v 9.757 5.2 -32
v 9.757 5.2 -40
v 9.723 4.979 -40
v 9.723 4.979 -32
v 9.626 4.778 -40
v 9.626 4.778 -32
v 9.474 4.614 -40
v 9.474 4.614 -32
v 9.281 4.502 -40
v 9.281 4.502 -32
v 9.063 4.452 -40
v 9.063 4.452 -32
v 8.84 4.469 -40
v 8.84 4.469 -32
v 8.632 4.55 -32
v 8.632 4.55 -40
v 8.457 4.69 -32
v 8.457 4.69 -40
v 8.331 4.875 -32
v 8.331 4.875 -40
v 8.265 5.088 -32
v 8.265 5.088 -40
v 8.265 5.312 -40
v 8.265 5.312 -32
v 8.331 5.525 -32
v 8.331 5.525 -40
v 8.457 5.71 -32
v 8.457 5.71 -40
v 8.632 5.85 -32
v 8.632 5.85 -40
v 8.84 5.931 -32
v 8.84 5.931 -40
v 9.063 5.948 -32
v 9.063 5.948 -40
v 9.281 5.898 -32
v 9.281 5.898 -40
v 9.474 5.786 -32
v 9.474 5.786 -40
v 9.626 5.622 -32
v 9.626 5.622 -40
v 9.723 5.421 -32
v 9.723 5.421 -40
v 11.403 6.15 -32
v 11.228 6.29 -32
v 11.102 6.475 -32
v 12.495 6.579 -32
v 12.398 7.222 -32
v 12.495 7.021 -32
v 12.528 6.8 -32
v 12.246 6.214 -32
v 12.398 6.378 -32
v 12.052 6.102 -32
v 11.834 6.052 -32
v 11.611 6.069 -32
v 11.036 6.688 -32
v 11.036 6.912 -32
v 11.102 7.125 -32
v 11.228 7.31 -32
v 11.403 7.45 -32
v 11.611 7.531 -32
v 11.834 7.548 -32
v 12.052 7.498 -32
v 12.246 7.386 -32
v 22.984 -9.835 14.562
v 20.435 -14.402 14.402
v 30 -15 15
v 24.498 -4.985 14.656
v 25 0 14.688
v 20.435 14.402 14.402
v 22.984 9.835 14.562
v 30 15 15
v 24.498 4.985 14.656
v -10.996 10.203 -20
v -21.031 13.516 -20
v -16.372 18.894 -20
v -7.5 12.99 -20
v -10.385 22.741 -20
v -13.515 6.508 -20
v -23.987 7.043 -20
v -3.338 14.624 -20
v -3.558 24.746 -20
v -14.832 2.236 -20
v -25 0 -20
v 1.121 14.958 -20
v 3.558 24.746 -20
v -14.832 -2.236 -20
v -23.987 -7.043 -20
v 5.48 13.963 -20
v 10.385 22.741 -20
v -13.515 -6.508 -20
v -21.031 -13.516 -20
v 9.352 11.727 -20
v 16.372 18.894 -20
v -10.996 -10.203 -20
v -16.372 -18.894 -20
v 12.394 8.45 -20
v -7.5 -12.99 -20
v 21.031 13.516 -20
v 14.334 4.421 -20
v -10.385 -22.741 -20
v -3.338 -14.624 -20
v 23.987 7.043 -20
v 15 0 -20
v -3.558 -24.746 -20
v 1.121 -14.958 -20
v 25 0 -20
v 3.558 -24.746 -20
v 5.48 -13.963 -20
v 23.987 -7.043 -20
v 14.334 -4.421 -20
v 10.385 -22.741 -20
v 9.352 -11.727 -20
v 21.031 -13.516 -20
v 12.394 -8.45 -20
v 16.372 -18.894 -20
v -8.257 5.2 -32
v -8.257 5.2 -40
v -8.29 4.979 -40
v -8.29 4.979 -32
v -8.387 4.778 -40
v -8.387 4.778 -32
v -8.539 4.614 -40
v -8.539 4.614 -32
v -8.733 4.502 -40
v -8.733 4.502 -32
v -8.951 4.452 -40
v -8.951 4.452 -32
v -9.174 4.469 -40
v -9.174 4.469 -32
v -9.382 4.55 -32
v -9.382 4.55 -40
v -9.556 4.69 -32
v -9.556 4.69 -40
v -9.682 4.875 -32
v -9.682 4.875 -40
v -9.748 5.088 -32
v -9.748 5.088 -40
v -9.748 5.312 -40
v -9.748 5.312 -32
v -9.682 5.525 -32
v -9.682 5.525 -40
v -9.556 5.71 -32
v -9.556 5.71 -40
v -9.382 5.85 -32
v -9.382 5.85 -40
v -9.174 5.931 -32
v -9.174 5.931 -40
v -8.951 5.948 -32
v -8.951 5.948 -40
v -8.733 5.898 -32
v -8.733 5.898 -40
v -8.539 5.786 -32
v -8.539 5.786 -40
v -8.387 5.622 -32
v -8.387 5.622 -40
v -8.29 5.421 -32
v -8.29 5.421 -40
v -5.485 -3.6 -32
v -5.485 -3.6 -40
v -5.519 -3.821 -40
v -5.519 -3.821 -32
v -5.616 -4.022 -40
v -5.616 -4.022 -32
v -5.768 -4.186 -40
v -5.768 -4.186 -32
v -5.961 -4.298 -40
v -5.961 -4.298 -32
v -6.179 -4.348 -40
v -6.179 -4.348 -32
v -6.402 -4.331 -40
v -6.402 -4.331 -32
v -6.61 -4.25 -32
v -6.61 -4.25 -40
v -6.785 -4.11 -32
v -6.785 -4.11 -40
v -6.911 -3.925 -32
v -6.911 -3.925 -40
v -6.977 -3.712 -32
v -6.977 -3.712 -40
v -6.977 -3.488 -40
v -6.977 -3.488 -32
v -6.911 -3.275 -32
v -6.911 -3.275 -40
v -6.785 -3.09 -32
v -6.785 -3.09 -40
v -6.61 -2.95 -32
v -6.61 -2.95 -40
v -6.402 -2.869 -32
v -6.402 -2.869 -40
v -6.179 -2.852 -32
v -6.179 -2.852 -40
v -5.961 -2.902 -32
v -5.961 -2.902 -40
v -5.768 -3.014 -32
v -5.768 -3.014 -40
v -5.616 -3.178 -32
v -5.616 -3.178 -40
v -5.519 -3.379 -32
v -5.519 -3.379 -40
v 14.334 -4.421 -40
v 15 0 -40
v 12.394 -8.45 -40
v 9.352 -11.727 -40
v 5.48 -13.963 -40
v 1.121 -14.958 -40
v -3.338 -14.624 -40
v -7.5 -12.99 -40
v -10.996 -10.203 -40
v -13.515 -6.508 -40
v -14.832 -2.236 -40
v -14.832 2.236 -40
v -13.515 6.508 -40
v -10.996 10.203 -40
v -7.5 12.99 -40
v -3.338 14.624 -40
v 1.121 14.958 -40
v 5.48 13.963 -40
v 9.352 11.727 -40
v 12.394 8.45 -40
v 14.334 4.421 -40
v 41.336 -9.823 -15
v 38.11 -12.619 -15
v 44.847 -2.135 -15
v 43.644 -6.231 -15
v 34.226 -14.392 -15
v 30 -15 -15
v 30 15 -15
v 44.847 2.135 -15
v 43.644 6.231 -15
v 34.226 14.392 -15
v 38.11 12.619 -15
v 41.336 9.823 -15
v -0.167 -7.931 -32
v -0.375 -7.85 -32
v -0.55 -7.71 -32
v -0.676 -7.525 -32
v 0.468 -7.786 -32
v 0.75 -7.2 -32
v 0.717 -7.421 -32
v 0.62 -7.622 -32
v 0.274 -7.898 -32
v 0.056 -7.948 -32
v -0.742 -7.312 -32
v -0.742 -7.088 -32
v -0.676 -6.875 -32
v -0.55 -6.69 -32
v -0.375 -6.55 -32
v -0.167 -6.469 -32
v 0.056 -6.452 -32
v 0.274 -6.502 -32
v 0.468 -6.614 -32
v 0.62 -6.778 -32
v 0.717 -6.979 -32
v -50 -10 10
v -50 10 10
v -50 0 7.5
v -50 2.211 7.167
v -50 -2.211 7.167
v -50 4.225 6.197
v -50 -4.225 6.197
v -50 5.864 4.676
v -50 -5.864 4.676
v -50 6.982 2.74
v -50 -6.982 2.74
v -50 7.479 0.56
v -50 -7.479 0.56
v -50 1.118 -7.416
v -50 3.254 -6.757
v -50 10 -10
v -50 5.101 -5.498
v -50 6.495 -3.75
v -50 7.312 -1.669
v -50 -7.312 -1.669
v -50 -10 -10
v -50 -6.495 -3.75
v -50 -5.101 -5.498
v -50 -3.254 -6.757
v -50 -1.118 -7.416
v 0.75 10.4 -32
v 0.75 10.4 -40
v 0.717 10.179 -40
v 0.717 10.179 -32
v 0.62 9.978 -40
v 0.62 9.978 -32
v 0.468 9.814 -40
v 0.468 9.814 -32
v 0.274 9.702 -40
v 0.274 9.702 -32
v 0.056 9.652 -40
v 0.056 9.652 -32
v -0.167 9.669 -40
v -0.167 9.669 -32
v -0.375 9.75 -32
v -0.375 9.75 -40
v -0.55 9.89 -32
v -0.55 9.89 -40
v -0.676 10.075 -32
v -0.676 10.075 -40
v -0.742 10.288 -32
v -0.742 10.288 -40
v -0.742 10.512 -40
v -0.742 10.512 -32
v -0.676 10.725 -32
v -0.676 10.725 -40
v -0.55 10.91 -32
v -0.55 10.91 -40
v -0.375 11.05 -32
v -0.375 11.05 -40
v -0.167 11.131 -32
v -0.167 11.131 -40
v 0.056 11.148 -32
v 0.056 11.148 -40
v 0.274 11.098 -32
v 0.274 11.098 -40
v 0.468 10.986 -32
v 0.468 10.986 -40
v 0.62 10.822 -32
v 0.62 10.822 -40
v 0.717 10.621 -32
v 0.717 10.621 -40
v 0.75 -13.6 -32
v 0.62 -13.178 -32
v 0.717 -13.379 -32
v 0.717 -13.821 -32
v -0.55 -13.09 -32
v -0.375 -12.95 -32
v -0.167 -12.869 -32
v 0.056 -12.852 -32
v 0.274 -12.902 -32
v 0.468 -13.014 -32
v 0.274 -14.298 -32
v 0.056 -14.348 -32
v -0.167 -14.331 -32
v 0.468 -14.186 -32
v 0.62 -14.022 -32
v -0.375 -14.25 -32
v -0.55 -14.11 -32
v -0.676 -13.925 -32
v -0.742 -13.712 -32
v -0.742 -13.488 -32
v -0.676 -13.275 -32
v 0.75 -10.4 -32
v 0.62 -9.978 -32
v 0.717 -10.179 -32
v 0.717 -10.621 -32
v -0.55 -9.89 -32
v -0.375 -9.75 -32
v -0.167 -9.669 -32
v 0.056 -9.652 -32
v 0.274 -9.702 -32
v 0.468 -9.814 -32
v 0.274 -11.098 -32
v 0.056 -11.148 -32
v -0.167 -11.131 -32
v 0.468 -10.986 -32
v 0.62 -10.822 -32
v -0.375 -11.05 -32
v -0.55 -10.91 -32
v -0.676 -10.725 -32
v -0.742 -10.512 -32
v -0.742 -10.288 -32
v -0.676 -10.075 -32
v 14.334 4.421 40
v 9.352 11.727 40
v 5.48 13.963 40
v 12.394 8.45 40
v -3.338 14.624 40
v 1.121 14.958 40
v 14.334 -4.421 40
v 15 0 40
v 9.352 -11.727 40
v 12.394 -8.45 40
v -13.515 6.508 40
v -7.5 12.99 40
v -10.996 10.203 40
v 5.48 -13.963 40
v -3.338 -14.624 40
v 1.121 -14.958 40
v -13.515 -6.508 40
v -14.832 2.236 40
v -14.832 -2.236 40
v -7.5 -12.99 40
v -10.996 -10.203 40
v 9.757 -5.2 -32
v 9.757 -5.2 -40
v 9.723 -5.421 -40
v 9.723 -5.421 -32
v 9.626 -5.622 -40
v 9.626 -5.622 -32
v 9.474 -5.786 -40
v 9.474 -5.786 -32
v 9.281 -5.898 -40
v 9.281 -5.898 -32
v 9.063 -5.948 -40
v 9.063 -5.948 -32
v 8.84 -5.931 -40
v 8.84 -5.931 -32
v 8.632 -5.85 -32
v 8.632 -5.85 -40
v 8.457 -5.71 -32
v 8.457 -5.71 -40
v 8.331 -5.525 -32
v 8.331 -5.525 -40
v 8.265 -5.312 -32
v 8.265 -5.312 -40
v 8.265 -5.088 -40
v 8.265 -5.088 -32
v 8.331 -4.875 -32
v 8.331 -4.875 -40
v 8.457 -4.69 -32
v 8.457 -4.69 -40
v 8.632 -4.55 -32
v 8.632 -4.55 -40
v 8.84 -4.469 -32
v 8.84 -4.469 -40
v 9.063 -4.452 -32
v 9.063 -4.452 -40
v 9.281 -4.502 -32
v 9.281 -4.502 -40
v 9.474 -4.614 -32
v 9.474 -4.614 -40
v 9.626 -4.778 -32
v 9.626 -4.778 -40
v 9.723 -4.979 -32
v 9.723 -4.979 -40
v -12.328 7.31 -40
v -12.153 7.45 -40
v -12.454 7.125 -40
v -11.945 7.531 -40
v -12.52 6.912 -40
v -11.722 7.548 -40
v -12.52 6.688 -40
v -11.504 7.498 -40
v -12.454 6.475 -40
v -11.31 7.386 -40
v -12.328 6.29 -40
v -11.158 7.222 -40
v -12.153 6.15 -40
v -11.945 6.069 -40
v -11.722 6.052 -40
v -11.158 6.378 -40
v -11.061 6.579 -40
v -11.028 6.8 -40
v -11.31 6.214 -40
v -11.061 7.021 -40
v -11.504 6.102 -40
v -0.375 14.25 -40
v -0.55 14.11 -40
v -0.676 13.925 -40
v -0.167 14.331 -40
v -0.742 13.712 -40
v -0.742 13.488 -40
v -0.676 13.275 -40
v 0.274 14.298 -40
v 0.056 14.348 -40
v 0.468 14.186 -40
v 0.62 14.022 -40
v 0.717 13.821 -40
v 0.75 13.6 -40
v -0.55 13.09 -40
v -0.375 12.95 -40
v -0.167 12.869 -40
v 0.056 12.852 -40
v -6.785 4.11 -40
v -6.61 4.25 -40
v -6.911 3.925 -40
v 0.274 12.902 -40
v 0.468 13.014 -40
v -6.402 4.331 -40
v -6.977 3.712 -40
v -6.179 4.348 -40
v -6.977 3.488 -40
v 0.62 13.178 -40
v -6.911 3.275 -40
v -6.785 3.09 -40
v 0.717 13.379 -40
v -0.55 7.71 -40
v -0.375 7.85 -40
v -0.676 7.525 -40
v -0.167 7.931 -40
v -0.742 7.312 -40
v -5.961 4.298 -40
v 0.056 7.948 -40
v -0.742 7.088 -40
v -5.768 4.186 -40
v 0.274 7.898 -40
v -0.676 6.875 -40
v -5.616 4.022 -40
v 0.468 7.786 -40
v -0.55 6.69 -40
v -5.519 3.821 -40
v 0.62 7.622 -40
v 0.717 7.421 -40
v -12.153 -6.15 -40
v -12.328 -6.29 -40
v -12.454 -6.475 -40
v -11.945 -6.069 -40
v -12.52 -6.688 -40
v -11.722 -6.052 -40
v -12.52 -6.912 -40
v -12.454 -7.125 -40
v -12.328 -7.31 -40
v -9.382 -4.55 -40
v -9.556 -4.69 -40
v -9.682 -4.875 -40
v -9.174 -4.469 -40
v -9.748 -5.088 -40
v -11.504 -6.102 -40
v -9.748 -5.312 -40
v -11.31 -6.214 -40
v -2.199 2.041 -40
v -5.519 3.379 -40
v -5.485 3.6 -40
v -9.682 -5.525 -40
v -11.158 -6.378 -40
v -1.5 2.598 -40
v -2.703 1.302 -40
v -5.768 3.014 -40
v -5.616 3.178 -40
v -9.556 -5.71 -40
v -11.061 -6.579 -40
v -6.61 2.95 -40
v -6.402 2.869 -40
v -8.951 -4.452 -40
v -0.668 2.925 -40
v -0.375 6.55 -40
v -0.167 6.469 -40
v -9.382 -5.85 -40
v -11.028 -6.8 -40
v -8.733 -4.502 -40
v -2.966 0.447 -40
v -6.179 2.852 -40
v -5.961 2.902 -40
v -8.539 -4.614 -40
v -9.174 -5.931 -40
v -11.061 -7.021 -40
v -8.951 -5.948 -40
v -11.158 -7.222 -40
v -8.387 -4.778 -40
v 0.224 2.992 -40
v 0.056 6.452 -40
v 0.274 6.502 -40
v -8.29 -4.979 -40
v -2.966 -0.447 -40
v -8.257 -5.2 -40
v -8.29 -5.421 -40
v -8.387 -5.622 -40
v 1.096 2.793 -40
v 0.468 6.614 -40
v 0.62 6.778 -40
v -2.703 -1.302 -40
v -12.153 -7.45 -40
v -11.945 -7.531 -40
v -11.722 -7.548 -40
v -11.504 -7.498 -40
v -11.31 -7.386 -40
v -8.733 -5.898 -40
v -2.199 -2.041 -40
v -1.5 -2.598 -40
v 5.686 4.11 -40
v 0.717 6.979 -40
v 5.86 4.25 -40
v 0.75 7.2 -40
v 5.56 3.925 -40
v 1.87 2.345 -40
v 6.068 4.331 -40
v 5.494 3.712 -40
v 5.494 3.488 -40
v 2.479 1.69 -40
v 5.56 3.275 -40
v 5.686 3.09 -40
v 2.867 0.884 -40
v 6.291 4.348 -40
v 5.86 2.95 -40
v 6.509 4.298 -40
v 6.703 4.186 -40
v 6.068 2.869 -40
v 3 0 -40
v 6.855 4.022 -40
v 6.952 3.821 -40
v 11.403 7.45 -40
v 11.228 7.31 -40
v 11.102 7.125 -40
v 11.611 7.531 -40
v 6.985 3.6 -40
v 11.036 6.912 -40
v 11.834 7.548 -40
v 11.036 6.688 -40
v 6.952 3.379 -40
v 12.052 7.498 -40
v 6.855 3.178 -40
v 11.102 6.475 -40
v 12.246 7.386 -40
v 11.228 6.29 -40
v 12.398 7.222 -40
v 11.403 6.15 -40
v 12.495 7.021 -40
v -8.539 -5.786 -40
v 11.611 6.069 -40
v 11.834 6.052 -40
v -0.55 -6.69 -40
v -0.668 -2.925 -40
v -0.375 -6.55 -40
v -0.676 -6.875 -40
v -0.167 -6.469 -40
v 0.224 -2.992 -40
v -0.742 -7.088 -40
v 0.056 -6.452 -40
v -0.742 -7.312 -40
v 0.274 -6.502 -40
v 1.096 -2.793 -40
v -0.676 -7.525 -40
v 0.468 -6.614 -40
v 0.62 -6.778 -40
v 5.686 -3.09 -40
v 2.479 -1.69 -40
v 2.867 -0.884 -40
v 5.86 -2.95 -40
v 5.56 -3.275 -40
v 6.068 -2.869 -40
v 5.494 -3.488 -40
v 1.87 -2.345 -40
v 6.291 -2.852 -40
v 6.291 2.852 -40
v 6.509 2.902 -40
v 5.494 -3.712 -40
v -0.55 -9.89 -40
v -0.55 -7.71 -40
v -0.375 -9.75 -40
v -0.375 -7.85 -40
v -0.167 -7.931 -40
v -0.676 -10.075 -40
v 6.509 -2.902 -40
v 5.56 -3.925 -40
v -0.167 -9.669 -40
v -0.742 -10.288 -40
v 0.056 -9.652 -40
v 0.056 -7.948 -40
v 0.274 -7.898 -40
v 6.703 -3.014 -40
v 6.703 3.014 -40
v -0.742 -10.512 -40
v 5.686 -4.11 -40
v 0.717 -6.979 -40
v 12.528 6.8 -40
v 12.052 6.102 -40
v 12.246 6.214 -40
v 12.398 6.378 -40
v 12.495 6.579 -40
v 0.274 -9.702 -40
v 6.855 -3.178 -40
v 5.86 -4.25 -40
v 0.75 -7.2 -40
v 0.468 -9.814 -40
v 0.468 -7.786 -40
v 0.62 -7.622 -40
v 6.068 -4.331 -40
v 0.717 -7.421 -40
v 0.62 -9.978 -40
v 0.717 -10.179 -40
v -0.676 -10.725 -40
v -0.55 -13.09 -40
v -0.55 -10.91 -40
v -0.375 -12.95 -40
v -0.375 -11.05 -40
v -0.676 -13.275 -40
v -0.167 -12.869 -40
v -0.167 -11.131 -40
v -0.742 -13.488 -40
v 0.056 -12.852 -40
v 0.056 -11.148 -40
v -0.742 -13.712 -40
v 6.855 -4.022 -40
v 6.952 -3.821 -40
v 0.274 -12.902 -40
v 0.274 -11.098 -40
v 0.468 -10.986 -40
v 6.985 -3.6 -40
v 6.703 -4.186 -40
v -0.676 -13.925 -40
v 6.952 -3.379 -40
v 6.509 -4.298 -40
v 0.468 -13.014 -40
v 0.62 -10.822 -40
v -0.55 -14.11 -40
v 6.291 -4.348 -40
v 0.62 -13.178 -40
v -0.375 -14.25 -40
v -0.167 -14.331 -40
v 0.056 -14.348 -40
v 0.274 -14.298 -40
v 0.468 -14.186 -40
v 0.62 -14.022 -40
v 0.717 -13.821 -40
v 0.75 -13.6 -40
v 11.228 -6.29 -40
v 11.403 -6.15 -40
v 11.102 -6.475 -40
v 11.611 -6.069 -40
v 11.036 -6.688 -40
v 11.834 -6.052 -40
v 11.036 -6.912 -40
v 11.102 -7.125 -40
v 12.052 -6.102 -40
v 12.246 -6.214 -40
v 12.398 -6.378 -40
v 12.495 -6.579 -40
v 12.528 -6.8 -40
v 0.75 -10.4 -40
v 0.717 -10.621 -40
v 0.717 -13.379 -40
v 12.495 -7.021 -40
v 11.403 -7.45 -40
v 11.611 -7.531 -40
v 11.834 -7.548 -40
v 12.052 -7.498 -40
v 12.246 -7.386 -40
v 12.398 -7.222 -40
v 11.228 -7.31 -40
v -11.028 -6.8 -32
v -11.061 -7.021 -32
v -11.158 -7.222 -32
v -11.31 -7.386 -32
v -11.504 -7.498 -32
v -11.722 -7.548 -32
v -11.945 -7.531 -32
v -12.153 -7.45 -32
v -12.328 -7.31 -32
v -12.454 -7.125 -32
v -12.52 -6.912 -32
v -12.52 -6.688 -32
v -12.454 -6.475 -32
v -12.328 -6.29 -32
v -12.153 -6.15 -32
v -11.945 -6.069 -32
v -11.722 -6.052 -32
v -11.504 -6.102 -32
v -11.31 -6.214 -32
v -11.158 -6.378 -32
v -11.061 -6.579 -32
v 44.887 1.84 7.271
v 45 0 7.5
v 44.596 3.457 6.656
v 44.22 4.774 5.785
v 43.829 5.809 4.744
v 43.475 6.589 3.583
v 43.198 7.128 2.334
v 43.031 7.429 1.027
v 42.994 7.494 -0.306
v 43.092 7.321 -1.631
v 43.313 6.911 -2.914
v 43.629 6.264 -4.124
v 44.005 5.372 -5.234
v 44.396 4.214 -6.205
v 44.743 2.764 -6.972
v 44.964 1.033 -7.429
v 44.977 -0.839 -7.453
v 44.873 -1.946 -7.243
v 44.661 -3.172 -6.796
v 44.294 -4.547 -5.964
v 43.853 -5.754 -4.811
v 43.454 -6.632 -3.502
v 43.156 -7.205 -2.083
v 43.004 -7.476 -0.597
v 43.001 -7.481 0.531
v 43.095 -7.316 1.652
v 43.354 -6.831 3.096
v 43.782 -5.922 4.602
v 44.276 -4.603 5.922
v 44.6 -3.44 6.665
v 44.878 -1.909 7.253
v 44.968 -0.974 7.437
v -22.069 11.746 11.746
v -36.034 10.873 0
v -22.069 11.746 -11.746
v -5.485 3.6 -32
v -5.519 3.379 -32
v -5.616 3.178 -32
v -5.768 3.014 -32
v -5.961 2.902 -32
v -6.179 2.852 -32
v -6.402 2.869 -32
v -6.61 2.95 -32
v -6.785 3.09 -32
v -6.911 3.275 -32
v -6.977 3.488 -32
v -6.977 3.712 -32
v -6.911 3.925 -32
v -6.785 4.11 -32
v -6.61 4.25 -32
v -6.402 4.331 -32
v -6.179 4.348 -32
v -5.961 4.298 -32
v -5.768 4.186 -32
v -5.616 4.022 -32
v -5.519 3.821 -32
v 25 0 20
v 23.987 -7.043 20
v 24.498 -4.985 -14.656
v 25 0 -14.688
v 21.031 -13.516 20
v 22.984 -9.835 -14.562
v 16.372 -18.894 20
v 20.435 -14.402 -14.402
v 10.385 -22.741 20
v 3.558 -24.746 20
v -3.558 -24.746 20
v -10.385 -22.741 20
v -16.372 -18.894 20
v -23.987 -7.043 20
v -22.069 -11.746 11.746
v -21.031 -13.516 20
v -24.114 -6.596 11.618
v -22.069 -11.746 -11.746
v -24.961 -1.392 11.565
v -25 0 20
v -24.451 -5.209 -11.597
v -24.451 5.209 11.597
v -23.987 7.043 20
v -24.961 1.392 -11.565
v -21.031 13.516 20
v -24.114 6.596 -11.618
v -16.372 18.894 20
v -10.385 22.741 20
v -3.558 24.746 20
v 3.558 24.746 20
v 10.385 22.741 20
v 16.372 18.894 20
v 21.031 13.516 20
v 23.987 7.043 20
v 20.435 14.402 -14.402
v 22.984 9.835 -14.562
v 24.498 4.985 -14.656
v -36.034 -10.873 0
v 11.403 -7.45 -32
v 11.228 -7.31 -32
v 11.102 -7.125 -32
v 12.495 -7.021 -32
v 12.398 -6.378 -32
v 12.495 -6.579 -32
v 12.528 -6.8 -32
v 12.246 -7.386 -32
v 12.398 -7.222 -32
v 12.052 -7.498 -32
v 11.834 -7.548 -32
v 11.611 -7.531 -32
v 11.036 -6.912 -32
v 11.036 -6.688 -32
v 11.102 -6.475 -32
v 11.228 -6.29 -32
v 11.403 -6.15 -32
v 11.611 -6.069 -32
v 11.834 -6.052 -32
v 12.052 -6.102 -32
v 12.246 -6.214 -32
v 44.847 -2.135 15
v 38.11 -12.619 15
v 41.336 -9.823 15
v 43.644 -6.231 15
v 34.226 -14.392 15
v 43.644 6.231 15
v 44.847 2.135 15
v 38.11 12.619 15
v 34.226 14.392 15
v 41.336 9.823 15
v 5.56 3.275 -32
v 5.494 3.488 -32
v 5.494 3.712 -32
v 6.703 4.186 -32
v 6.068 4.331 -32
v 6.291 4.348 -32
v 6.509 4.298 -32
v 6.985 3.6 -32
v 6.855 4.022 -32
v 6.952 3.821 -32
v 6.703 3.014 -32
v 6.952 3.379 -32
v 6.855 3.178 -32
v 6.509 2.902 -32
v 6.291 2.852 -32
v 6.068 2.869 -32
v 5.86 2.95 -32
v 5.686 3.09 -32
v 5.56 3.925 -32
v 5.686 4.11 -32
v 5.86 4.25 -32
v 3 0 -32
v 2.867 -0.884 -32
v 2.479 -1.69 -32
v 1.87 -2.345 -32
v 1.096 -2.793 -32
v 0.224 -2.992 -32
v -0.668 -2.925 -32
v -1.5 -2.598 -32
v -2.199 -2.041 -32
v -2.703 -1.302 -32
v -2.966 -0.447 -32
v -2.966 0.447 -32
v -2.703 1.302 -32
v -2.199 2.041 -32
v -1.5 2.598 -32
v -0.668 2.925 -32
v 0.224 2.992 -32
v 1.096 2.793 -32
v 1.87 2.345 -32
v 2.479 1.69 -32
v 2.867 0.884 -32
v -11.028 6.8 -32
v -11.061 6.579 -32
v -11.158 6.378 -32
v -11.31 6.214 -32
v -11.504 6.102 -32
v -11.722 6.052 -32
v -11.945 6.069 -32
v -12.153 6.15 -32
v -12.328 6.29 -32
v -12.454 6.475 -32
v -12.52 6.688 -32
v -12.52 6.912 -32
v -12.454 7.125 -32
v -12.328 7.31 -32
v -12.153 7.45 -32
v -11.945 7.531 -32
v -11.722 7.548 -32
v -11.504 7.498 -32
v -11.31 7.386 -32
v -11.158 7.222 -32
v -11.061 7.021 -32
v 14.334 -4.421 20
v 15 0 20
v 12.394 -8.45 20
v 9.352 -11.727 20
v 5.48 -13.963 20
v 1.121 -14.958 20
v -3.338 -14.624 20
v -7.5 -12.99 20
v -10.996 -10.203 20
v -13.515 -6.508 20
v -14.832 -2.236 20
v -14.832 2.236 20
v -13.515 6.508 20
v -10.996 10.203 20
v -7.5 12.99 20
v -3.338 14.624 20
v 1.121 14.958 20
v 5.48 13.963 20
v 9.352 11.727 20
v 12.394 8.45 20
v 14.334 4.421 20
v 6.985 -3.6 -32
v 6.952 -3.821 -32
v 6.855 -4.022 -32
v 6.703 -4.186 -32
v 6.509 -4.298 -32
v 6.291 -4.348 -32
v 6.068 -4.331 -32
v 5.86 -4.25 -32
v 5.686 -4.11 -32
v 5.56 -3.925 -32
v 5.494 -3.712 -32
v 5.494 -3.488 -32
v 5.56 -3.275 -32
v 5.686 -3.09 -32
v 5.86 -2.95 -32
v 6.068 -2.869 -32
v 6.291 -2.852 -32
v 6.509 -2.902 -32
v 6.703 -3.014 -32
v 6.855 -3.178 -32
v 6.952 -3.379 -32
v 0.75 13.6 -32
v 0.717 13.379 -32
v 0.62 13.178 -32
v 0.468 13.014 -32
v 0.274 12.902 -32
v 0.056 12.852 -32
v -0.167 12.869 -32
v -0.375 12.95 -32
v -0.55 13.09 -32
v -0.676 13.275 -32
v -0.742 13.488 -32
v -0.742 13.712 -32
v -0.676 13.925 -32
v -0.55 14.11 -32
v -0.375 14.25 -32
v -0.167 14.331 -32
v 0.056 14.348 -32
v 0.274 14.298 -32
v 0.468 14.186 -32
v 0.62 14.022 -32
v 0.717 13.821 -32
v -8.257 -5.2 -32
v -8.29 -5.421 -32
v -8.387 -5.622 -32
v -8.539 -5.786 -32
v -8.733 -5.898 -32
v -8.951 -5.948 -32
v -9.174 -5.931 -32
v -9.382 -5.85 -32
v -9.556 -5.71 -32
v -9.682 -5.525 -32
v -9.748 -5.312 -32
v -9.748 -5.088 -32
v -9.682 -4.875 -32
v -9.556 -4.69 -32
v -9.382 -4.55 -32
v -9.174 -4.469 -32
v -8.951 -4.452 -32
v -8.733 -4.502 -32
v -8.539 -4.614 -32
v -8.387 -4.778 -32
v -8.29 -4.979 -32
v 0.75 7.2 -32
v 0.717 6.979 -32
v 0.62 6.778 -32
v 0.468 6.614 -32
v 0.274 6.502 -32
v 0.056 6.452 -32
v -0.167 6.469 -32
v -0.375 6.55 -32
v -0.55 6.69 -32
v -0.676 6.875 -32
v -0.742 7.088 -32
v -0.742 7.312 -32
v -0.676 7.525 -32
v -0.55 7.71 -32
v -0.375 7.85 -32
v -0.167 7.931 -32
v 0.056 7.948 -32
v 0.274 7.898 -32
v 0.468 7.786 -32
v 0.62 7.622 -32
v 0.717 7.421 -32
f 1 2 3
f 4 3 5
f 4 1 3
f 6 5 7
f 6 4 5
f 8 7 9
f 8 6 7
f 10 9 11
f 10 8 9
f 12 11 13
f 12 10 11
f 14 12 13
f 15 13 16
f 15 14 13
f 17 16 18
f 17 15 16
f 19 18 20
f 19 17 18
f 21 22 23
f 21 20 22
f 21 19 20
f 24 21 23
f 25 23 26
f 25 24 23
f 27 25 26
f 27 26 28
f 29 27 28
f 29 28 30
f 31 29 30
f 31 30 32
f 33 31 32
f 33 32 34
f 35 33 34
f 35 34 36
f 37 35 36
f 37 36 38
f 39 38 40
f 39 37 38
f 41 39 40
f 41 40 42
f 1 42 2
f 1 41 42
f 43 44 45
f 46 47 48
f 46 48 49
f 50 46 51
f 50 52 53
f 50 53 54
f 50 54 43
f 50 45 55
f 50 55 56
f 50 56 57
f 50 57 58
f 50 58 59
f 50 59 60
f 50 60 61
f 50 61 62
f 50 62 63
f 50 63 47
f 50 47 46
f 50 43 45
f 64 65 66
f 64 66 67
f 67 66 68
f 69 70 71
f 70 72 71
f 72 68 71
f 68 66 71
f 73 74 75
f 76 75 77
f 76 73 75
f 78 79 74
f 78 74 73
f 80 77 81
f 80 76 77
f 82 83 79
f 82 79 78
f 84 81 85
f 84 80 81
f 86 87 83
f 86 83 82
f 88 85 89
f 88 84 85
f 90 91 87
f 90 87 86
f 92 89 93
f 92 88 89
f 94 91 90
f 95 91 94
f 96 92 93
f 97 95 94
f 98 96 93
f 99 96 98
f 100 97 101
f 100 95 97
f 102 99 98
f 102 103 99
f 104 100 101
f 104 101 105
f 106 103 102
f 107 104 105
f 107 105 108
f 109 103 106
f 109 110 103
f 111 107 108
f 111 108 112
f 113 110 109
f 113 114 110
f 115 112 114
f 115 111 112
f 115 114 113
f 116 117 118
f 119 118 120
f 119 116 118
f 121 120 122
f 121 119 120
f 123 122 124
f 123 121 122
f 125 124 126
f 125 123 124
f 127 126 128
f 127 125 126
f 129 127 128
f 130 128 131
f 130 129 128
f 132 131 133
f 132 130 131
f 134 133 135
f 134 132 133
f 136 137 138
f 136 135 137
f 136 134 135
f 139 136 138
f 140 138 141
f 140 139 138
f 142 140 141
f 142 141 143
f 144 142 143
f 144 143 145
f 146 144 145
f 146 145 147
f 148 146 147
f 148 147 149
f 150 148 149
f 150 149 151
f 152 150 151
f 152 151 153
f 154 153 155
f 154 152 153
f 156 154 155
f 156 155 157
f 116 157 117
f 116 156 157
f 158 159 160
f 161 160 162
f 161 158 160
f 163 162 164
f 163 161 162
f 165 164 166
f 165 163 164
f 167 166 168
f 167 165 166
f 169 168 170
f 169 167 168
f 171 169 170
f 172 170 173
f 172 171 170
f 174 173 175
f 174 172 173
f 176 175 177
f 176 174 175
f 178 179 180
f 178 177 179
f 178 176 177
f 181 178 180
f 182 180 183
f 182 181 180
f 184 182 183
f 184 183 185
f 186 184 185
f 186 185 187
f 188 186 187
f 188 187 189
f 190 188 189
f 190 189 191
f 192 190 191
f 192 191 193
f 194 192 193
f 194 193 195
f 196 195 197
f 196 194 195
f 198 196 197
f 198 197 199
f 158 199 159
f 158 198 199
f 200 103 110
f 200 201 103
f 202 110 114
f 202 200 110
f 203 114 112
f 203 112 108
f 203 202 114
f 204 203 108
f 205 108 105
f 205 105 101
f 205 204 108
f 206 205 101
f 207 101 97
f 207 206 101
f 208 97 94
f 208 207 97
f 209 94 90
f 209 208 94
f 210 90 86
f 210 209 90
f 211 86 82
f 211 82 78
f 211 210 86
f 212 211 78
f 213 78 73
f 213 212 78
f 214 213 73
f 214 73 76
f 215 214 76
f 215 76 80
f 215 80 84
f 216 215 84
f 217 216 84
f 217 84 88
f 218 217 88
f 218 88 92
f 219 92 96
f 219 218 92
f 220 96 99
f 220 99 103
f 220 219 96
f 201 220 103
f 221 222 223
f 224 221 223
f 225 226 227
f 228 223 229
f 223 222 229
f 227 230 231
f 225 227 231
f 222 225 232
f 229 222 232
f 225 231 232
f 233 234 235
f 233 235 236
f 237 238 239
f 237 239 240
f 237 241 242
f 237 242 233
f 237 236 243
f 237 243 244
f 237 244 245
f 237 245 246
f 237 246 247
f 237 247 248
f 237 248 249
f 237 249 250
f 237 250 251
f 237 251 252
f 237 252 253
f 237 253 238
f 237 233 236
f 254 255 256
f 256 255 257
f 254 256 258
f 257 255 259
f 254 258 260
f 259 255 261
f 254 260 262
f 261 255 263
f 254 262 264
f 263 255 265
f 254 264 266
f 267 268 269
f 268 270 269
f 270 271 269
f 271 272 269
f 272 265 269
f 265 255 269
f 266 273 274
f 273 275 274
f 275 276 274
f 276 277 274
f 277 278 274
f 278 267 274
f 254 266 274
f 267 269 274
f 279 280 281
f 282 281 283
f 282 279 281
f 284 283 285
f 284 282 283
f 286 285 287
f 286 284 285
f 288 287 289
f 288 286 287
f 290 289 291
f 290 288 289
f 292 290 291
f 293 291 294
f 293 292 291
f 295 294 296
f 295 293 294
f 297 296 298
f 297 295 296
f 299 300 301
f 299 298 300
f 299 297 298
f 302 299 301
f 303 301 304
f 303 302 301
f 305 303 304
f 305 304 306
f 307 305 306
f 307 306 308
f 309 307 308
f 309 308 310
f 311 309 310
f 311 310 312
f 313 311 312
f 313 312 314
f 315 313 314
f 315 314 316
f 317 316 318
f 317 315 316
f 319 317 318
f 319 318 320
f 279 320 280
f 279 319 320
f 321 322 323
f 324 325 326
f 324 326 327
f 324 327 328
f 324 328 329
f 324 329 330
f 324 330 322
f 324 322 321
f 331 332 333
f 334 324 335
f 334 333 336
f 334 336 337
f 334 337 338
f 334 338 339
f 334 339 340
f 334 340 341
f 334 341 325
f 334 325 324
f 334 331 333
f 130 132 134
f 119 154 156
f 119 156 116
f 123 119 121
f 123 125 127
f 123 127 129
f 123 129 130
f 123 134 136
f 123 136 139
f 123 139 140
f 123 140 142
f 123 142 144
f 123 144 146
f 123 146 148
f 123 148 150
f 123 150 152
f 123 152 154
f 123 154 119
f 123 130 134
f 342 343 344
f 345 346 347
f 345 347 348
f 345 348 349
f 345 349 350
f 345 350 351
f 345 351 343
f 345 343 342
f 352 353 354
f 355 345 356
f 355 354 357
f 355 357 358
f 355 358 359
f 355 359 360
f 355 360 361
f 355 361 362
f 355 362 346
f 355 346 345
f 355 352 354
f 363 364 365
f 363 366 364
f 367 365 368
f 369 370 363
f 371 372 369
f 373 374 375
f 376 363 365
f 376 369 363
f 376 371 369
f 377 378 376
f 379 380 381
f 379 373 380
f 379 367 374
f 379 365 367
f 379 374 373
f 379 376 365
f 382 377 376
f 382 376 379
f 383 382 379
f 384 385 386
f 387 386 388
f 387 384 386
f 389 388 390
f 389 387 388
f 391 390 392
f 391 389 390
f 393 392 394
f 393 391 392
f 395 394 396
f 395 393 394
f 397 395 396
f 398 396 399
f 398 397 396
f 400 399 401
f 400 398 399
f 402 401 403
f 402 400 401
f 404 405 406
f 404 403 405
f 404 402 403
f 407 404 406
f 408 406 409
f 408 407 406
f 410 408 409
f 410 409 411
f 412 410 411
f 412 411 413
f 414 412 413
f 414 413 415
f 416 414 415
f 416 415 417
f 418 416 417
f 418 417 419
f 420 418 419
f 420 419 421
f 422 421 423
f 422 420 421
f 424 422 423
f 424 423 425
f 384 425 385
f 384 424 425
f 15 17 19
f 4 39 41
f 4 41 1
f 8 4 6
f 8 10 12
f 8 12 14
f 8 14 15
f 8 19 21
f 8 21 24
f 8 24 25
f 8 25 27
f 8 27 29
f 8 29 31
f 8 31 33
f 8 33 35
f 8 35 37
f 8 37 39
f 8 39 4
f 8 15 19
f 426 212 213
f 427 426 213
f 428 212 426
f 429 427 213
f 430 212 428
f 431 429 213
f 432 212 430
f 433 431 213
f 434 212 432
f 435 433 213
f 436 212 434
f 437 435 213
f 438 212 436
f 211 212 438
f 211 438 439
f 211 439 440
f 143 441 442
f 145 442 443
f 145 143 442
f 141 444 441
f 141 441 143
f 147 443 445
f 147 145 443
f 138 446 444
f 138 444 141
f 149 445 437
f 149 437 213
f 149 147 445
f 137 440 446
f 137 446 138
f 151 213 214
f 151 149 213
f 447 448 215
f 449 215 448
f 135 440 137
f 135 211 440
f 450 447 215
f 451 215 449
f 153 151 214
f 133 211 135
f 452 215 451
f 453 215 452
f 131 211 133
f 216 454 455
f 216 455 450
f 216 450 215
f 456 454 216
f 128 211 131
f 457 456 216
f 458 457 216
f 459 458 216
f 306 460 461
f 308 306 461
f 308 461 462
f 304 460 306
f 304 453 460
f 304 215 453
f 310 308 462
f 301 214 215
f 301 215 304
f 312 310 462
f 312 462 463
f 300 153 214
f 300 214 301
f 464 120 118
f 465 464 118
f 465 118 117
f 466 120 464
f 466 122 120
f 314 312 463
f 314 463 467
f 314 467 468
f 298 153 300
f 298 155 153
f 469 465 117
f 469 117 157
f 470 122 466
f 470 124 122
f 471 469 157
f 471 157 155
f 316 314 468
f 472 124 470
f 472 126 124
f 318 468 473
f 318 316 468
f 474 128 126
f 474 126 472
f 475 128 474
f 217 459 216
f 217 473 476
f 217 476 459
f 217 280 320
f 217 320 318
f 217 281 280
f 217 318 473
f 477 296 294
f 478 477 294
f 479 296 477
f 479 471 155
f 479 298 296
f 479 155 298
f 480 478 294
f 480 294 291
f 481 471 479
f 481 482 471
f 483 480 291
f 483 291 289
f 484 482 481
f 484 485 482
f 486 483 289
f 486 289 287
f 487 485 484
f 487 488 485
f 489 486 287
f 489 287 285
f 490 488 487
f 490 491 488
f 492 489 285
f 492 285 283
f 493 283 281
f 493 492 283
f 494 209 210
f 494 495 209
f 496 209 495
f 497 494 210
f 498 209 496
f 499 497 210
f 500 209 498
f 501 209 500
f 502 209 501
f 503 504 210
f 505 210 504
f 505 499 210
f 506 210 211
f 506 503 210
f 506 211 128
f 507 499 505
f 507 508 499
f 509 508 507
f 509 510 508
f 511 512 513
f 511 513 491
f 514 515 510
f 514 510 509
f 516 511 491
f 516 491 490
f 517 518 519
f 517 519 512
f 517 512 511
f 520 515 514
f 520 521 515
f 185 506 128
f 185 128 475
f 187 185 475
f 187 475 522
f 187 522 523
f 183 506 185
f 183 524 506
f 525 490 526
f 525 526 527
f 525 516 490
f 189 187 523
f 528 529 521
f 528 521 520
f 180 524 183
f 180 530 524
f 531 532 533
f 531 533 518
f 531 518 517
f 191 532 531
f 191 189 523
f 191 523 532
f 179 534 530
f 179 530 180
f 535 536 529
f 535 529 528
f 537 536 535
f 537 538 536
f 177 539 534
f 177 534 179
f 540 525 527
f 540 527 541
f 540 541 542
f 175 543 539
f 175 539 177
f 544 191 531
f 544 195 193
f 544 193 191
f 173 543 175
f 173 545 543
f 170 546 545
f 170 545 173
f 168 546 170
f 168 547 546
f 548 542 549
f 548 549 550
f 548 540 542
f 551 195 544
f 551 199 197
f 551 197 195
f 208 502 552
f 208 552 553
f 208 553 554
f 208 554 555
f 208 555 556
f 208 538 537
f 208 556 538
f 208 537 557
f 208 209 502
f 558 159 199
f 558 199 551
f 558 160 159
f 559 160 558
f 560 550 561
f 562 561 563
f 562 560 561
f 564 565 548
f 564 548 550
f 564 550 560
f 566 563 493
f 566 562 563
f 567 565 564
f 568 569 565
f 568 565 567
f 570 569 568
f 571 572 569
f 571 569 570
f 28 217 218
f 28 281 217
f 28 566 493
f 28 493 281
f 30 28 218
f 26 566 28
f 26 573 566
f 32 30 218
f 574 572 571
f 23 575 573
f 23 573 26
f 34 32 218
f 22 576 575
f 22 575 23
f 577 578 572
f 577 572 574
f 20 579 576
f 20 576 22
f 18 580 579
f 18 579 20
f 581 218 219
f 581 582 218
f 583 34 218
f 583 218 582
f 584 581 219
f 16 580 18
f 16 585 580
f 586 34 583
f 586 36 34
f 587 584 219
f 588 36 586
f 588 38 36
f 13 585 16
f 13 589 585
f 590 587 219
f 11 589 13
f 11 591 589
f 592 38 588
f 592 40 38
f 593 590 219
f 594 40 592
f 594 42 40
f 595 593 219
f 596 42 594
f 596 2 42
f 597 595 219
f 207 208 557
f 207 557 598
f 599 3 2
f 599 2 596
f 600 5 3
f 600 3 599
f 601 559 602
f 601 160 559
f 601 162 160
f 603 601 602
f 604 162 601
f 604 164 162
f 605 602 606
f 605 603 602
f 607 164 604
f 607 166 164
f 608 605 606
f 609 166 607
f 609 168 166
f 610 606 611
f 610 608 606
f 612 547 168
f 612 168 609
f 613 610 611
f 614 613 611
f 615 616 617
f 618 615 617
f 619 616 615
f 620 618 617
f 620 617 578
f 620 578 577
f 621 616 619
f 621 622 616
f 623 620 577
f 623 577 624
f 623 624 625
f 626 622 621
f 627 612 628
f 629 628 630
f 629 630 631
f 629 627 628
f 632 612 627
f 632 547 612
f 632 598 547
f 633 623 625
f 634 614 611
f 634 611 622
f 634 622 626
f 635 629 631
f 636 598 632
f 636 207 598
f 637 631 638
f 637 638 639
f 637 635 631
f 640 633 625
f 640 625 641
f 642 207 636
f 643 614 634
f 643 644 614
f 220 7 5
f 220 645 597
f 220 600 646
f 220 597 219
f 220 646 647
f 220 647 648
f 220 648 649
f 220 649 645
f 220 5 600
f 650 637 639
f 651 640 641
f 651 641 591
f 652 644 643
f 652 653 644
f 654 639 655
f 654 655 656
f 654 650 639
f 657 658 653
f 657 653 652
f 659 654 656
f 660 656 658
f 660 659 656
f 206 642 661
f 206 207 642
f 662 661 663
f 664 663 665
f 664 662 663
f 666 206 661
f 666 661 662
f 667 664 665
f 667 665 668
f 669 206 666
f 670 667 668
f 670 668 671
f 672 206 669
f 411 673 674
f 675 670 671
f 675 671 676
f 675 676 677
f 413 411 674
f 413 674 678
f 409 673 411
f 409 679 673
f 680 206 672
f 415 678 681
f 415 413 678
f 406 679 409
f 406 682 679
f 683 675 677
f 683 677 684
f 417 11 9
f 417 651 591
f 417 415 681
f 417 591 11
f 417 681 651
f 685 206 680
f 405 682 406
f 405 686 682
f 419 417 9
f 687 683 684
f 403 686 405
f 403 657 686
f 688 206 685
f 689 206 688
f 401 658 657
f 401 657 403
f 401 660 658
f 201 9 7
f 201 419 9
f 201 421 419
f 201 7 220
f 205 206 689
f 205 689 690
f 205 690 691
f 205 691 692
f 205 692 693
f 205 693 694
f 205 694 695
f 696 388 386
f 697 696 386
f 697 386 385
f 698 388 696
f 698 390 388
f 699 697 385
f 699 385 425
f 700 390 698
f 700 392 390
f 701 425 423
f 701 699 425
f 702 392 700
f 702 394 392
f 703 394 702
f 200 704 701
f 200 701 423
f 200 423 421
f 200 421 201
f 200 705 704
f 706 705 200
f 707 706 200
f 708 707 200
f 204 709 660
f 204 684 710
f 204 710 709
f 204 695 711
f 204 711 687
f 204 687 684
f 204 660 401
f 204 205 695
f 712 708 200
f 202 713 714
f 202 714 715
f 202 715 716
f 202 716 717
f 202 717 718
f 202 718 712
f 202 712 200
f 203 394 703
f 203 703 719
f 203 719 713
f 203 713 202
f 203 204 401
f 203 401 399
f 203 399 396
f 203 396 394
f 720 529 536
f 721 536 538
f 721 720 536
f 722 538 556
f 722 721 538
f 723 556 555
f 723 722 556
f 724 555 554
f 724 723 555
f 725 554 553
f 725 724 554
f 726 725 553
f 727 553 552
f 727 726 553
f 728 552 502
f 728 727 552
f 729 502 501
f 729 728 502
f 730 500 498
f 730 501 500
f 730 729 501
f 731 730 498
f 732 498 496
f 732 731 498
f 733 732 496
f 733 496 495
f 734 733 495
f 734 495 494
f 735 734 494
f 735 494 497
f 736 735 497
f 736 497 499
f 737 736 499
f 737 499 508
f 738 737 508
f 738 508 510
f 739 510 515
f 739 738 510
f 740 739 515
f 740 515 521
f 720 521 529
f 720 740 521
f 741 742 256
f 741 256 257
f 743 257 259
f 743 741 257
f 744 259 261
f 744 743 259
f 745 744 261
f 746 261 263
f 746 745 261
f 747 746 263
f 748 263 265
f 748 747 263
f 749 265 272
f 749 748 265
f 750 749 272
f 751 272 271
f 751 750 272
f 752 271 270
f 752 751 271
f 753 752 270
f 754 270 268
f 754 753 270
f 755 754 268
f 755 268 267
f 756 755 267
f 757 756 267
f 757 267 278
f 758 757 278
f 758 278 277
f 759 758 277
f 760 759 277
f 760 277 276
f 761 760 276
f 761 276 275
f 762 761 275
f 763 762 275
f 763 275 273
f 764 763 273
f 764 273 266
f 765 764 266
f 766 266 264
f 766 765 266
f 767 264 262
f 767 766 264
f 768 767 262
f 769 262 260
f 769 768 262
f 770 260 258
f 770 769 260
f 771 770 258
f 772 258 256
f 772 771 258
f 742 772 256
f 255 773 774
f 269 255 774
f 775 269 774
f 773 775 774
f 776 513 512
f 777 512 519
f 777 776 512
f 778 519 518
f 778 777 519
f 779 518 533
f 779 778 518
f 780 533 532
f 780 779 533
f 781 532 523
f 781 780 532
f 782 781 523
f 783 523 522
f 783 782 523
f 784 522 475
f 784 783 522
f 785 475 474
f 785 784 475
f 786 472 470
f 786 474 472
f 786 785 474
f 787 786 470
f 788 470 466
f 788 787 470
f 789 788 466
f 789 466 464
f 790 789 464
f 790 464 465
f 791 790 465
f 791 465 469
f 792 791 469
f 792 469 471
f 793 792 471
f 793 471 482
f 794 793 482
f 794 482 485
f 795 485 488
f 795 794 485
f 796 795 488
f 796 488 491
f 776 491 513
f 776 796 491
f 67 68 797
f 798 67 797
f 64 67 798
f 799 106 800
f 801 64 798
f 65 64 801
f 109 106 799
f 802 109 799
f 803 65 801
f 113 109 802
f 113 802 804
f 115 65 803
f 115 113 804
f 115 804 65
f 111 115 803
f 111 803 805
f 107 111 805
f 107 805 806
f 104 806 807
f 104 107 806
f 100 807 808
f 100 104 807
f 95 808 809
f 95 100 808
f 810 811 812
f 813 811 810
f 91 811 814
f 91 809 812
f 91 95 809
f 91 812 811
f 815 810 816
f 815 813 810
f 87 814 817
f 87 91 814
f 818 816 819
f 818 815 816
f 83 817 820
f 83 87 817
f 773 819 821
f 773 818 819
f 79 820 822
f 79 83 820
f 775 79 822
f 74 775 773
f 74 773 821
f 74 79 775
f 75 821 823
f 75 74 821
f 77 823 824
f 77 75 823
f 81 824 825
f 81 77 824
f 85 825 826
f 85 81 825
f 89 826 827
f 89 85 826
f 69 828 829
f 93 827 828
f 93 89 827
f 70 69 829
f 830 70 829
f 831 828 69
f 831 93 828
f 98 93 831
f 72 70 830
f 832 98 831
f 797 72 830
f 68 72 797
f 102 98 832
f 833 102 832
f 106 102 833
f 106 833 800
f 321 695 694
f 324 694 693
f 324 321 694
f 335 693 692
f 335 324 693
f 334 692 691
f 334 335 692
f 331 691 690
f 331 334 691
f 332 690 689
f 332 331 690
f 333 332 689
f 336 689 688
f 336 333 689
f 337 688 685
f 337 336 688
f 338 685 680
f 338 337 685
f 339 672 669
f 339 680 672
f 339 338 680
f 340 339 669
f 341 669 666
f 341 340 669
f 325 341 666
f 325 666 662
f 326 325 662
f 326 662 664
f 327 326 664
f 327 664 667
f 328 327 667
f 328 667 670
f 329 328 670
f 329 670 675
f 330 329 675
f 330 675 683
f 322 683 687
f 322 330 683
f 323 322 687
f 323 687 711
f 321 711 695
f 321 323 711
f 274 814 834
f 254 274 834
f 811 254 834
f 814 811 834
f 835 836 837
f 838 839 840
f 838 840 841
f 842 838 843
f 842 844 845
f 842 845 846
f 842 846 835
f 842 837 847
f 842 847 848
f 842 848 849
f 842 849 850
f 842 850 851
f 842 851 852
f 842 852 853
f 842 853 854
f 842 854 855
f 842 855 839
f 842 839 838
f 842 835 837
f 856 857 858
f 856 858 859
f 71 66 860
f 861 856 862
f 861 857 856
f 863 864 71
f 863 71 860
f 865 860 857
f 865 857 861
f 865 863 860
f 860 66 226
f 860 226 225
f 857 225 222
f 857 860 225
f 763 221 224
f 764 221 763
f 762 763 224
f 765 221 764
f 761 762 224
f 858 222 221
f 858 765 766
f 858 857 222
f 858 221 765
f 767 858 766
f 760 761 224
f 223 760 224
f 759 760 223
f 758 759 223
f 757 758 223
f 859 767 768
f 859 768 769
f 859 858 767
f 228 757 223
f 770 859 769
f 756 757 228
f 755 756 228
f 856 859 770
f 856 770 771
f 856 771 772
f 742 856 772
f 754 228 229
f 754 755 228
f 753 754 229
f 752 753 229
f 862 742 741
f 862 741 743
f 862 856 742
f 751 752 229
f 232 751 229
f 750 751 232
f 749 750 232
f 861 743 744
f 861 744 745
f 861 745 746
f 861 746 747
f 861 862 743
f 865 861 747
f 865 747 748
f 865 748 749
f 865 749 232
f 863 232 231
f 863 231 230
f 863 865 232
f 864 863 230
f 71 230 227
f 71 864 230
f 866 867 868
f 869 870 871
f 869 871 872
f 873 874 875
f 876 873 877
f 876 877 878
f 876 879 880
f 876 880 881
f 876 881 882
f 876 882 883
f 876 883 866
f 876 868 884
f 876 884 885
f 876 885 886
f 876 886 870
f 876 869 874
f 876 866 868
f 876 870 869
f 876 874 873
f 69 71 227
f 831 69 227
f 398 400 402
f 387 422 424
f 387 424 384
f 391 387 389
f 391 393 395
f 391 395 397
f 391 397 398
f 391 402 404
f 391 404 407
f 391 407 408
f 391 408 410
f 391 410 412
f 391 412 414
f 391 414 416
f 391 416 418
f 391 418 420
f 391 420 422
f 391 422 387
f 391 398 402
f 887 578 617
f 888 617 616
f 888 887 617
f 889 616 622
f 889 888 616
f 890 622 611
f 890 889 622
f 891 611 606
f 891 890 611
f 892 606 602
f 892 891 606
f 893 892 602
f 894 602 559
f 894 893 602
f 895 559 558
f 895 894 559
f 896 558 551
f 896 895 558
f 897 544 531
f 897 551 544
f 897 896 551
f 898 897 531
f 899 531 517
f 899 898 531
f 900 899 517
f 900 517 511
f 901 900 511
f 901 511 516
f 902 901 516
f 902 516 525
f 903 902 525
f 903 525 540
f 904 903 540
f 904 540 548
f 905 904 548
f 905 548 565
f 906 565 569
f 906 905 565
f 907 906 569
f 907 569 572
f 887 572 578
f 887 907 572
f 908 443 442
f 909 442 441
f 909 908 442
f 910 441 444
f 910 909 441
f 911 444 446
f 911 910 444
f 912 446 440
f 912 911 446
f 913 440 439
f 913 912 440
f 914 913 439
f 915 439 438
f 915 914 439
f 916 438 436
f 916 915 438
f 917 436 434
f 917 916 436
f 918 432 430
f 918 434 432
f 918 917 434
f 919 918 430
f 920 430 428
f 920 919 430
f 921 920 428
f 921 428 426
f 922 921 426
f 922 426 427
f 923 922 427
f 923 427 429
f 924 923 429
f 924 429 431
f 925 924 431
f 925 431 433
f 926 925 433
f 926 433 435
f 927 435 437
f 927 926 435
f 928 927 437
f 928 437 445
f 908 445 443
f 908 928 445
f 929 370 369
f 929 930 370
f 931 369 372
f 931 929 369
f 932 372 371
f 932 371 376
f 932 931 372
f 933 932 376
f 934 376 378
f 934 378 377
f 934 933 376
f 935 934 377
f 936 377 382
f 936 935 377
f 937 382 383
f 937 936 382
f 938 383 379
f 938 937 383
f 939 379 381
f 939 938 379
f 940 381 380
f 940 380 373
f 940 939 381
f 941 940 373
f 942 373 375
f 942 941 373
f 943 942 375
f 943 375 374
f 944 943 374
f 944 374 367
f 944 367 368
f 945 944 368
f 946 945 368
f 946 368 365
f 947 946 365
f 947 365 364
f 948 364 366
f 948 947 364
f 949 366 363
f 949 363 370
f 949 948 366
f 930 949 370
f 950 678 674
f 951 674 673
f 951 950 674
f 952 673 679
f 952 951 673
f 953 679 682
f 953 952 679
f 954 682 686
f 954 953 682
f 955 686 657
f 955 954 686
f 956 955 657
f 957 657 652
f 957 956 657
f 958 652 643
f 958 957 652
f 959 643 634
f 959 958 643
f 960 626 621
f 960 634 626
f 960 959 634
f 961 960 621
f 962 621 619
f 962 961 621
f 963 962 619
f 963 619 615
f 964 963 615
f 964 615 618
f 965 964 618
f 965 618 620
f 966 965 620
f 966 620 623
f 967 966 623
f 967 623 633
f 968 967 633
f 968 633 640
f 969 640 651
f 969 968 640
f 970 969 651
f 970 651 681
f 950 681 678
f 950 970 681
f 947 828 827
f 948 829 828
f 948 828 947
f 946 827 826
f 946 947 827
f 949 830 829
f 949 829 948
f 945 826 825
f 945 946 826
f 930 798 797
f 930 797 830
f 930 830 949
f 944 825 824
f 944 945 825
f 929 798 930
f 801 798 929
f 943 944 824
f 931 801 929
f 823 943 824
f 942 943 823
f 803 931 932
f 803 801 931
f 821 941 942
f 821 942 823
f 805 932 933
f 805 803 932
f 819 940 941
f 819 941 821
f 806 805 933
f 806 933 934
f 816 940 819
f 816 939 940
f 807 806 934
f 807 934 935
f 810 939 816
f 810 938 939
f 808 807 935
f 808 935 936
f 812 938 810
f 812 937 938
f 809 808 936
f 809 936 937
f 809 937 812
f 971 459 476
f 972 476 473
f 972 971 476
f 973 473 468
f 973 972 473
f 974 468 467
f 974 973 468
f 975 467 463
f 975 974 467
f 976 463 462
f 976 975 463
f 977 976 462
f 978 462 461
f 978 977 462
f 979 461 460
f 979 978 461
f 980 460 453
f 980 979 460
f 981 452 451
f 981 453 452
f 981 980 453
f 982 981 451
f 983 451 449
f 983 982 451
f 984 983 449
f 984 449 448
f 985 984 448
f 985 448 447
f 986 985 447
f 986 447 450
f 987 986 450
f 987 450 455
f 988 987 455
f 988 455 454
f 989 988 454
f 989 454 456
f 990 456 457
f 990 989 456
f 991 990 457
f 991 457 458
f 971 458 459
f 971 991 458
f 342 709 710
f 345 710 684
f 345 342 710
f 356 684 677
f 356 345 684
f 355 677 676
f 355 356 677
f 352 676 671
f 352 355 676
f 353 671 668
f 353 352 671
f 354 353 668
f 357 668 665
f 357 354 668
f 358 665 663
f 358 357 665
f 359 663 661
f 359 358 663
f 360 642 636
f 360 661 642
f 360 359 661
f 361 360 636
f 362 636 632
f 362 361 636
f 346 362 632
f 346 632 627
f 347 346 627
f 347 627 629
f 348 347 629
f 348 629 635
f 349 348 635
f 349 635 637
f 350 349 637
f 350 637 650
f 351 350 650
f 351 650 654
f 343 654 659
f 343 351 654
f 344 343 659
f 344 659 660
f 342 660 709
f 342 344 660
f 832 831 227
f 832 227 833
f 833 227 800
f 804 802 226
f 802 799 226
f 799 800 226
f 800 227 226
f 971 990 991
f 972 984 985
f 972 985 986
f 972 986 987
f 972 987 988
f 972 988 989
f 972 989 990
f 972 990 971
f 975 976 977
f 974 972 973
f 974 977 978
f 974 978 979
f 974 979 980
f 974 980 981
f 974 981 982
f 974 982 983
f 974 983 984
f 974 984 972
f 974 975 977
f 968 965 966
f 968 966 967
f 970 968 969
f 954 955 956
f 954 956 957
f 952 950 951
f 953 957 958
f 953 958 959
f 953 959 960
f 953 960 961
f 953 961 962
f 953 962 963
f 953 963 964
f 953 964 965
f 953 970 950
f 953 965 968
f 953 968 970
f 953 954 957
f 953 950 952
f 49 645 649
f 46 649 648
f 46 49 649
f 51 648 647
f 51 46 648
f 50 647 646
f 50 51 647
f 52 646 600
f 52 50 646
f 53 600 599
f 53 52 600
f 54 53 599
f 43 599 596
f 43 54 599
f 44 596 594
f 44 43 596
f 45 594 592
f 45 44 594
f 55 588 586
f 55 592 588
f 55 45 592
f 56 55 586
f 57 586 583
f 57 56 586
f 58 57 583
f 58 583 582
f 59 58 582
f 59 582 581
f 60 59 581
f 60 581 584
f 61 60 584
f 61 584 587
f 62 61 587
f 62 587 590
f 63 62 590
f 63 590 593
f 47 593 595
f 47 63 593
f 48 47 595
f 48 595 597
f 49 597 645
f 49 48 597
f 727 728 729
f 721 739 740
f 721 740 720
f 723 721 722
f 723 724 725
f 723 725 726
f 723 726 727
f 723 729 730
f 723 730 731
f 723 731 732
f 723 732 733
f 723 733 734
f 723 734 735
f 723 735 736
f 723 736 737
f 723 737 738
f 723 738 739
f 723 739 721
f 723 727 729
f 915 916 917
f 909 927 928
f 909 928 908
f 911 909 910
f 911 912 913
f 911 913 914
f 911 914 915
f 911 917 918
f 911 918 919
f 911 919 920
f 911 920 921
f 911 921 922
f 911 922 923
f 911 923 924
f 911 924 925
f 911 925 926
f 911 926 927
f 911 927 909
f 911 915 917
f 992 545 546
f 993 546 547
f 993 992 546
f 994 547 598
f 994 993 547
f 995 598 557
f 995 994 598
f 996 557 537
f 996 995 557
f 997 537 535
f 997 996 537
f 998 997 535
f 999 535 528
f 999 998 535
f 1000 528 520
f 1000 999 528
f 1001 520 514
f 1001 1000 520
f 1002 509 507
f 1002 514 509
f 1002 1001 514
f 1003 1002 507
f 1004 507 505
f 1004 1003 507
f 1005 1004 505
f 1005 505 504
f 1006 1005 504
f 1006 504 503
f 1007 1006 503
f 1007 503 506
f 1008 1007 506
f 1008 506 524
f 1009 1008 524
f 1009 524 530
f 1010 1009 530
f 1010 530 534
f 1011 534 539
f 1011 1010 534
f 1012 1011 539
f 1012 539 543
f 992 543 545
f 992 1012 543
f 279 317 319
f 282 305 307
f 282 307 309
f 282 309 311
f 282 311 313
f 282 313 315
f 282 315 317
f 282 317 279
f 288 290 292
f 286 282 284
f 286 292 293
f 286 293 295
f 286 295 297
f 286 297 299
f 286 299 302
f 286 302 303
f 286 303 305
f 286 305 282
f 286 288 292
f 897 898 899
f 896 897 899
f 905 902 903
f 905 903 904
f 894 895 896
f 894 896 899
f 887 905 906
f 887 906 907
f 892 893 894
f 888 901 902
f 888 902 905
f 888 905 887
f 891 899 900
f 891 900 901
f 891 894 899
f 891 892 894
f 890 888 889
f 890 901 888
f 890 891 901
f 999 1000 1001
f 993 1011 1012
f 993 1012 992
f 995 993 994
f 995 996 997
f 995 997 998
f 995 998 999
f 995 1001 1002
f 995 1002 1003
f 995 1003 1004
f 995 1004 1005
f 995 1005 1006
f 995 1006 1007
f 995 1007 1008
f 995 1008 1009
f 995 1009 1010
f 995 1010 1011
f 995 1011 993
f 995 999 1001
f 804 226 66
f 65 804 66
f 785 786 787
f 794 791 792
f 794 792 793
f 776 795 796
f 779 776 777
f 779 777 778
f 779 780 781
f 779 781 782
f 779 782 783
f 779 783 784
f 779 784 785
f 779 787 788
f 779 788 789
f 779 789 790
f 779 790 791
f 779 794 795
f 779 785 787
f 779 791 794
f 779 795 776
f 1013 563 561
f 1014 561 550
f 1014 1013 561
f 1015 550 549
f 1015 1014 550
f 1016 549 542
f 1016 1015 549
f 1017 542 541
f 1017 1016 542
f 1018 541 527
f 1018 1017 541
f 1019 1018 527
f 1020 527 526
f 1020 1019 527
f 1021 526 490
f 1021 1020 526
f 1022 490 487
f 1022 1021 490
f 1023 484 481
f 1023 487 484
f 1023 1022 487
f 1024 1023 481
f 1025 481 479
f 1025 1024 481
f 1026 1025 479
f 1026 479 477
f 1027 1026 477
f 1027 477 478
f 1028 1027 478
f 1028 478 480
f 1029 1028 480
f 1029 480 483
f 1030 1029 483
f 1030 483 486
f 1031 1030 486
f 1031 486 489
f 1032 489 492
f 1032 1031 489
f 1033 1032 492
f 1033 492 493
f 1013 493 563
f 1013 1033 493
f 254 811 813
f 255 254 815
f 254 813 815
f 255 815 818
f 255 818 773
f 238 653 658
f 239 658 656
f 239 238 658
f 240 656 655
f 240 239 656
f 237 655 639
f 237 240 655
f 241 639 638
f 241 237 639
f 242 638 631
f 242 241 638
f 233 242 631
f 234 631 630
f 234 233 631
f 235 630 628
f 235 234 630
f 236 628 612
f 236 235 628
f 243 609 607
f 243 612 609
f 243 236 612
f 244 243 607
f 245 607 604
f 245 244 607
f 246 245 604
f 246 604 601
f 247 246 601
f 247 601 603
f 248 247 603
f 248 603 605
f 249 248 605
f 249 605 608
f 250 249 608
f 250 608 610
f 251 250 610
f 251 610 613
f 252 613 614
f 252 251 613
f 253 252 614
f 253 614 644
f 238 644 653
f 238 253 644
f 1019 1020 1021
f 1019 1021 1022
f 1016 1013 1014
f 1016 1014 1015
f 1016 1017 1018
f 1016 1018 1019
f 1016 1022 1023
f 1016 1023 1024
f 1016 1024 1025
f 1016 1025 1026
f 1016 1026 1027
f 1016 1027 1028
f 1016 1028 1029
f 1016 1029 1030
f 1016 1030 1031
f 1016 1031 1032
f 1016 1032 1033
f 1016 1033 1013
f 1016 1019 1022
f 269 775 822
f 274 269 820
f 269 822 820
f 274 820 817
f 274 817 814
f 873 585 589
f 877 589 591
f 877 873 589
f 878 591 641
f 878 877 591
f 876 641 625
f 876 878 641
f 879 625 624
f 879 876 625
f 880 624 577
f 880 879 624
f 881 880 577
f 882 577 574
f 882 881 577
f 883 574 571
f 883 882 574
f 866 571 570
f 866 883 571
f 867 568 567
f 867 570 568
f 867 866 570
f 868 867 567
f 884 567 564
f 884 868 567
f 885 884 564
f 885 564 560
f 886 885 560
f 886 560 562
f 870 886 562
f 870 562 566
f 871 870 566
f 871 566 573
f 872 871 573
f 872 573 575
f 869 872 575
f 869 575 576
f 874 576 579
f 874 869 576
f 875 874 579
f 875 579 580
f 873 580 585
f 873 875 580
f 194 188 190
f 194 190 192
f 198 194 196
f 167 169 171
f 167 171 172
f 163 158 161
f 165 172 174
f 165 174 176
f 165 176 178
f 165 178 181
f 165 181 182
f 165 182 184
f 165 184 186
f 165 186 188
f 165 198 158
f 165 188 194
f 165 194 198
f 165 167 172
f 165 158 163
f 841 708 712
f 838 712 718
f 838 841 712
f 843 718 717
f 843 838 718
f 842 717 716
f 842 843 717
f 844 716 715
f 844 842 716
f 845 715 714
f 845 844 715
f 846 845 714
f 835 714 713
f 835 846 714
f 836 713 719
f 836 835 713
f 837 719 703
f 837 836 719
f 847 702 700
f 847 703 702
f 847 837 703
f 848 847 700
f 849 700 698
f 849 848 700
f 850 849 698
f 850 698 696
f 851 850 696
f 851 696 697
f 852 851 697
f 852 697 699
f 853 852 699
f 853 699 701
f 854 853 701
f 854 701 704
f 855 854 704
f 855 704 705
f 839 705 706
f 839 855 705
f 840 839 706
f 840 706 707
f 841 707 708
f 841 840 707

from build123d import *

# Parameters (mm, degrees)
BOSS_EXTRUDE1_DEPTH     = 15
CUT_EXTRUDE1_DEPTH      = 107.066017202
CUT_EXTRUDE1_DEPTH_BACK = 107.066017202
SKETCH8_R               = 7.5
CUT_EXTRUDE2_DEPTH      = 98.596106557
CUT_EXTRUDE2_DEPTH_BACK = 8
SKETCH9_R               = 0.75
SKETCH9_R_2             = 3


with BuildPart() as part:
    # Sketch1 → Revolve1 (revolve)
    with BuildSketch(Plane(origin=(0, 0, 0), x_dir=(0, 0, -1), z_dir=(1, 0, 0)), mode=Mode.PRIVATE) as revolve1_sk:
        Polygon((0, 0), (-40, 0), (-40, 15), (-20, 15), (-20, 25), (20, 25), (20, 15), (40, 15), (40, 0), align=None)
    revolve(revolve1_sk.sketch.rotate(Axis((0, 0, 74.697986577), (0, 0, -1)), 90), axis=Axis((0, 0, 74.697986577), (0, 0, -1)))

    # Sketch3 → Loft1 section 0
    with BuildSketch(Plane(origin=(-50, 0, 0), x_dir=(0, 0, -1), z_dir=(1, 0, 0))):
        with BuildLine():
            Line((-10, 10), (10, 10))
            Line((10, 10), (10, -10))
            Line((10, -10), (-10, -10))
            Line((-10, -10), (-10, 10))
        make_face()
    # Sketch4 → Loft1 section 1
    with BuildSketch(Plane(origin=(30, 0, 0), x_dir=(0, 0, -1), z_dir=(1, 0, 0))):
        with BuildLine():
            Line((-15, 15), (15, 15))
            Line((15, 15), (15, -15))
            Line((15, -15), (-15, -15))
            Line((-15, -15), (-15, 15))
        make_face()
    loft()

    # Sketch7 → Boss-Extrude1 (add, symmetric)
    with BuildSketch(Plane.XY):
        with BuildLine():
            Line((30, 15), (30, -15))
            ThreePointArc((30, -15), (45, 0), (30, 15))
        make_face()
    extrude(amount=BOSS_EXTRUDE1_DEPTH, both=True)

    # Sketch8 → Cut-Extrude1 (cut, two sides: drawn at the far end of the back side and taken through both)
    with BuildSketch(Plane.ZY.offset(50).offset(-CUT_EXTRUDE1_DEPTH_BACK)):
        Circle(SKETCH8_R)
    extrude(amount=CUT_EXTRUDE1_DEPTH + CUT_EXTRUDE1_DEPTH_BACK, mode=Mode.SUBTRACT)

    # Sketch9 → Cut-Extrude2 (cut, two sides: drawn at the far end of the back side and taken through both)
    with BuildSketch(Plane(origin=(0, 0, -40), x_dir=(-1, 0, 0), z_dir=(0, 0, -1)).offset(-CUT_EXTRUDE2_DEPTH_BACK)):
        with Locations(Location((0, 7.2, 0), (0, 0, 180))):
            Circle(SKETCH9_R)
        with Locations(Location((0, 10.4, 0), (0, 0, 180))):
            Circle(SKETCH9_R)
        with Locations(Location((0, 13.6, 0), (0, 0, 180))):
            Circle(SKETCH9_R)
        with Locations(Location((11.777945491, 6.8, 0), (0, 0, 180))):
            Circle(SKETCH9_R)
        with Locations(Location((9.006664199, 5.2, 0), (0, 0, 180))):
            Circle(SKETCH9_R)
        with Locations(Location((6.235382907, 3.6, 0), (0, 0, 180))):
            Circle(SKETCH9_R)
        with Locations(Location((11.777945491, -6.8, 0), (0, 0, 180))):
            Circle(SKETCH9_R)
        with Locations(Location((9.006664199, -5.2, 0), (0, 0, 180))):
            Circle(SKETCH9_R)
        with Locations(Location((6.235382907, -3.6, 0), (0, 0, 180))):
            Circle(SKETCH9_R)
        with Locations(Location((0, -13.6, 0), (0, 0, 180))):
            Circle(SKETCH9_R)
        with Locations(Location((0, -10.4, 0), (0, 0, 180))):
            Circle(SKETCH9_R)
        with Locations(Location((0, -7.2, 0), (0, 0, 180))):
            Circle(SKETCH9_R)
        with Locations(Location((-11.777945491, -6.8, 0), (0, 0, 180))):
            Circle(SKETCH9_R)
        with Locations(Location((-9.006664199, -5.2, 0), (0, 0, 180))):
            Circle(SKETCH9_R)
        with Locations(Location((-6.235382907, -3.6, 0), (0, 0, 180))):
            Circle(SKETCH9_R)
        with Locations(Location((-11.777945491, 6.8, 0), (0, 0, 180))):
            Circle(SKETCH9_R)
        with Locations(Location((-9.006664199, 5.2, 0), (0, 0, 180))):
            Circle(SKETCH9_R)
        with Locations(Location((-6.235382907, 3.6, 0), (0, 0, 180))):
            Circle(SKETCH9_R)
        with Locations(Location((0, 0, 0), (0, 0, 180))):
            Circle(SKETCH9_R_2)
    extrude(amount=CUT_EXTRUDE2_DEPTH + CUT_EXTRUDE2_DEPTH_BACK, mode=Mode.SUBTRACT)


solid = part.part
